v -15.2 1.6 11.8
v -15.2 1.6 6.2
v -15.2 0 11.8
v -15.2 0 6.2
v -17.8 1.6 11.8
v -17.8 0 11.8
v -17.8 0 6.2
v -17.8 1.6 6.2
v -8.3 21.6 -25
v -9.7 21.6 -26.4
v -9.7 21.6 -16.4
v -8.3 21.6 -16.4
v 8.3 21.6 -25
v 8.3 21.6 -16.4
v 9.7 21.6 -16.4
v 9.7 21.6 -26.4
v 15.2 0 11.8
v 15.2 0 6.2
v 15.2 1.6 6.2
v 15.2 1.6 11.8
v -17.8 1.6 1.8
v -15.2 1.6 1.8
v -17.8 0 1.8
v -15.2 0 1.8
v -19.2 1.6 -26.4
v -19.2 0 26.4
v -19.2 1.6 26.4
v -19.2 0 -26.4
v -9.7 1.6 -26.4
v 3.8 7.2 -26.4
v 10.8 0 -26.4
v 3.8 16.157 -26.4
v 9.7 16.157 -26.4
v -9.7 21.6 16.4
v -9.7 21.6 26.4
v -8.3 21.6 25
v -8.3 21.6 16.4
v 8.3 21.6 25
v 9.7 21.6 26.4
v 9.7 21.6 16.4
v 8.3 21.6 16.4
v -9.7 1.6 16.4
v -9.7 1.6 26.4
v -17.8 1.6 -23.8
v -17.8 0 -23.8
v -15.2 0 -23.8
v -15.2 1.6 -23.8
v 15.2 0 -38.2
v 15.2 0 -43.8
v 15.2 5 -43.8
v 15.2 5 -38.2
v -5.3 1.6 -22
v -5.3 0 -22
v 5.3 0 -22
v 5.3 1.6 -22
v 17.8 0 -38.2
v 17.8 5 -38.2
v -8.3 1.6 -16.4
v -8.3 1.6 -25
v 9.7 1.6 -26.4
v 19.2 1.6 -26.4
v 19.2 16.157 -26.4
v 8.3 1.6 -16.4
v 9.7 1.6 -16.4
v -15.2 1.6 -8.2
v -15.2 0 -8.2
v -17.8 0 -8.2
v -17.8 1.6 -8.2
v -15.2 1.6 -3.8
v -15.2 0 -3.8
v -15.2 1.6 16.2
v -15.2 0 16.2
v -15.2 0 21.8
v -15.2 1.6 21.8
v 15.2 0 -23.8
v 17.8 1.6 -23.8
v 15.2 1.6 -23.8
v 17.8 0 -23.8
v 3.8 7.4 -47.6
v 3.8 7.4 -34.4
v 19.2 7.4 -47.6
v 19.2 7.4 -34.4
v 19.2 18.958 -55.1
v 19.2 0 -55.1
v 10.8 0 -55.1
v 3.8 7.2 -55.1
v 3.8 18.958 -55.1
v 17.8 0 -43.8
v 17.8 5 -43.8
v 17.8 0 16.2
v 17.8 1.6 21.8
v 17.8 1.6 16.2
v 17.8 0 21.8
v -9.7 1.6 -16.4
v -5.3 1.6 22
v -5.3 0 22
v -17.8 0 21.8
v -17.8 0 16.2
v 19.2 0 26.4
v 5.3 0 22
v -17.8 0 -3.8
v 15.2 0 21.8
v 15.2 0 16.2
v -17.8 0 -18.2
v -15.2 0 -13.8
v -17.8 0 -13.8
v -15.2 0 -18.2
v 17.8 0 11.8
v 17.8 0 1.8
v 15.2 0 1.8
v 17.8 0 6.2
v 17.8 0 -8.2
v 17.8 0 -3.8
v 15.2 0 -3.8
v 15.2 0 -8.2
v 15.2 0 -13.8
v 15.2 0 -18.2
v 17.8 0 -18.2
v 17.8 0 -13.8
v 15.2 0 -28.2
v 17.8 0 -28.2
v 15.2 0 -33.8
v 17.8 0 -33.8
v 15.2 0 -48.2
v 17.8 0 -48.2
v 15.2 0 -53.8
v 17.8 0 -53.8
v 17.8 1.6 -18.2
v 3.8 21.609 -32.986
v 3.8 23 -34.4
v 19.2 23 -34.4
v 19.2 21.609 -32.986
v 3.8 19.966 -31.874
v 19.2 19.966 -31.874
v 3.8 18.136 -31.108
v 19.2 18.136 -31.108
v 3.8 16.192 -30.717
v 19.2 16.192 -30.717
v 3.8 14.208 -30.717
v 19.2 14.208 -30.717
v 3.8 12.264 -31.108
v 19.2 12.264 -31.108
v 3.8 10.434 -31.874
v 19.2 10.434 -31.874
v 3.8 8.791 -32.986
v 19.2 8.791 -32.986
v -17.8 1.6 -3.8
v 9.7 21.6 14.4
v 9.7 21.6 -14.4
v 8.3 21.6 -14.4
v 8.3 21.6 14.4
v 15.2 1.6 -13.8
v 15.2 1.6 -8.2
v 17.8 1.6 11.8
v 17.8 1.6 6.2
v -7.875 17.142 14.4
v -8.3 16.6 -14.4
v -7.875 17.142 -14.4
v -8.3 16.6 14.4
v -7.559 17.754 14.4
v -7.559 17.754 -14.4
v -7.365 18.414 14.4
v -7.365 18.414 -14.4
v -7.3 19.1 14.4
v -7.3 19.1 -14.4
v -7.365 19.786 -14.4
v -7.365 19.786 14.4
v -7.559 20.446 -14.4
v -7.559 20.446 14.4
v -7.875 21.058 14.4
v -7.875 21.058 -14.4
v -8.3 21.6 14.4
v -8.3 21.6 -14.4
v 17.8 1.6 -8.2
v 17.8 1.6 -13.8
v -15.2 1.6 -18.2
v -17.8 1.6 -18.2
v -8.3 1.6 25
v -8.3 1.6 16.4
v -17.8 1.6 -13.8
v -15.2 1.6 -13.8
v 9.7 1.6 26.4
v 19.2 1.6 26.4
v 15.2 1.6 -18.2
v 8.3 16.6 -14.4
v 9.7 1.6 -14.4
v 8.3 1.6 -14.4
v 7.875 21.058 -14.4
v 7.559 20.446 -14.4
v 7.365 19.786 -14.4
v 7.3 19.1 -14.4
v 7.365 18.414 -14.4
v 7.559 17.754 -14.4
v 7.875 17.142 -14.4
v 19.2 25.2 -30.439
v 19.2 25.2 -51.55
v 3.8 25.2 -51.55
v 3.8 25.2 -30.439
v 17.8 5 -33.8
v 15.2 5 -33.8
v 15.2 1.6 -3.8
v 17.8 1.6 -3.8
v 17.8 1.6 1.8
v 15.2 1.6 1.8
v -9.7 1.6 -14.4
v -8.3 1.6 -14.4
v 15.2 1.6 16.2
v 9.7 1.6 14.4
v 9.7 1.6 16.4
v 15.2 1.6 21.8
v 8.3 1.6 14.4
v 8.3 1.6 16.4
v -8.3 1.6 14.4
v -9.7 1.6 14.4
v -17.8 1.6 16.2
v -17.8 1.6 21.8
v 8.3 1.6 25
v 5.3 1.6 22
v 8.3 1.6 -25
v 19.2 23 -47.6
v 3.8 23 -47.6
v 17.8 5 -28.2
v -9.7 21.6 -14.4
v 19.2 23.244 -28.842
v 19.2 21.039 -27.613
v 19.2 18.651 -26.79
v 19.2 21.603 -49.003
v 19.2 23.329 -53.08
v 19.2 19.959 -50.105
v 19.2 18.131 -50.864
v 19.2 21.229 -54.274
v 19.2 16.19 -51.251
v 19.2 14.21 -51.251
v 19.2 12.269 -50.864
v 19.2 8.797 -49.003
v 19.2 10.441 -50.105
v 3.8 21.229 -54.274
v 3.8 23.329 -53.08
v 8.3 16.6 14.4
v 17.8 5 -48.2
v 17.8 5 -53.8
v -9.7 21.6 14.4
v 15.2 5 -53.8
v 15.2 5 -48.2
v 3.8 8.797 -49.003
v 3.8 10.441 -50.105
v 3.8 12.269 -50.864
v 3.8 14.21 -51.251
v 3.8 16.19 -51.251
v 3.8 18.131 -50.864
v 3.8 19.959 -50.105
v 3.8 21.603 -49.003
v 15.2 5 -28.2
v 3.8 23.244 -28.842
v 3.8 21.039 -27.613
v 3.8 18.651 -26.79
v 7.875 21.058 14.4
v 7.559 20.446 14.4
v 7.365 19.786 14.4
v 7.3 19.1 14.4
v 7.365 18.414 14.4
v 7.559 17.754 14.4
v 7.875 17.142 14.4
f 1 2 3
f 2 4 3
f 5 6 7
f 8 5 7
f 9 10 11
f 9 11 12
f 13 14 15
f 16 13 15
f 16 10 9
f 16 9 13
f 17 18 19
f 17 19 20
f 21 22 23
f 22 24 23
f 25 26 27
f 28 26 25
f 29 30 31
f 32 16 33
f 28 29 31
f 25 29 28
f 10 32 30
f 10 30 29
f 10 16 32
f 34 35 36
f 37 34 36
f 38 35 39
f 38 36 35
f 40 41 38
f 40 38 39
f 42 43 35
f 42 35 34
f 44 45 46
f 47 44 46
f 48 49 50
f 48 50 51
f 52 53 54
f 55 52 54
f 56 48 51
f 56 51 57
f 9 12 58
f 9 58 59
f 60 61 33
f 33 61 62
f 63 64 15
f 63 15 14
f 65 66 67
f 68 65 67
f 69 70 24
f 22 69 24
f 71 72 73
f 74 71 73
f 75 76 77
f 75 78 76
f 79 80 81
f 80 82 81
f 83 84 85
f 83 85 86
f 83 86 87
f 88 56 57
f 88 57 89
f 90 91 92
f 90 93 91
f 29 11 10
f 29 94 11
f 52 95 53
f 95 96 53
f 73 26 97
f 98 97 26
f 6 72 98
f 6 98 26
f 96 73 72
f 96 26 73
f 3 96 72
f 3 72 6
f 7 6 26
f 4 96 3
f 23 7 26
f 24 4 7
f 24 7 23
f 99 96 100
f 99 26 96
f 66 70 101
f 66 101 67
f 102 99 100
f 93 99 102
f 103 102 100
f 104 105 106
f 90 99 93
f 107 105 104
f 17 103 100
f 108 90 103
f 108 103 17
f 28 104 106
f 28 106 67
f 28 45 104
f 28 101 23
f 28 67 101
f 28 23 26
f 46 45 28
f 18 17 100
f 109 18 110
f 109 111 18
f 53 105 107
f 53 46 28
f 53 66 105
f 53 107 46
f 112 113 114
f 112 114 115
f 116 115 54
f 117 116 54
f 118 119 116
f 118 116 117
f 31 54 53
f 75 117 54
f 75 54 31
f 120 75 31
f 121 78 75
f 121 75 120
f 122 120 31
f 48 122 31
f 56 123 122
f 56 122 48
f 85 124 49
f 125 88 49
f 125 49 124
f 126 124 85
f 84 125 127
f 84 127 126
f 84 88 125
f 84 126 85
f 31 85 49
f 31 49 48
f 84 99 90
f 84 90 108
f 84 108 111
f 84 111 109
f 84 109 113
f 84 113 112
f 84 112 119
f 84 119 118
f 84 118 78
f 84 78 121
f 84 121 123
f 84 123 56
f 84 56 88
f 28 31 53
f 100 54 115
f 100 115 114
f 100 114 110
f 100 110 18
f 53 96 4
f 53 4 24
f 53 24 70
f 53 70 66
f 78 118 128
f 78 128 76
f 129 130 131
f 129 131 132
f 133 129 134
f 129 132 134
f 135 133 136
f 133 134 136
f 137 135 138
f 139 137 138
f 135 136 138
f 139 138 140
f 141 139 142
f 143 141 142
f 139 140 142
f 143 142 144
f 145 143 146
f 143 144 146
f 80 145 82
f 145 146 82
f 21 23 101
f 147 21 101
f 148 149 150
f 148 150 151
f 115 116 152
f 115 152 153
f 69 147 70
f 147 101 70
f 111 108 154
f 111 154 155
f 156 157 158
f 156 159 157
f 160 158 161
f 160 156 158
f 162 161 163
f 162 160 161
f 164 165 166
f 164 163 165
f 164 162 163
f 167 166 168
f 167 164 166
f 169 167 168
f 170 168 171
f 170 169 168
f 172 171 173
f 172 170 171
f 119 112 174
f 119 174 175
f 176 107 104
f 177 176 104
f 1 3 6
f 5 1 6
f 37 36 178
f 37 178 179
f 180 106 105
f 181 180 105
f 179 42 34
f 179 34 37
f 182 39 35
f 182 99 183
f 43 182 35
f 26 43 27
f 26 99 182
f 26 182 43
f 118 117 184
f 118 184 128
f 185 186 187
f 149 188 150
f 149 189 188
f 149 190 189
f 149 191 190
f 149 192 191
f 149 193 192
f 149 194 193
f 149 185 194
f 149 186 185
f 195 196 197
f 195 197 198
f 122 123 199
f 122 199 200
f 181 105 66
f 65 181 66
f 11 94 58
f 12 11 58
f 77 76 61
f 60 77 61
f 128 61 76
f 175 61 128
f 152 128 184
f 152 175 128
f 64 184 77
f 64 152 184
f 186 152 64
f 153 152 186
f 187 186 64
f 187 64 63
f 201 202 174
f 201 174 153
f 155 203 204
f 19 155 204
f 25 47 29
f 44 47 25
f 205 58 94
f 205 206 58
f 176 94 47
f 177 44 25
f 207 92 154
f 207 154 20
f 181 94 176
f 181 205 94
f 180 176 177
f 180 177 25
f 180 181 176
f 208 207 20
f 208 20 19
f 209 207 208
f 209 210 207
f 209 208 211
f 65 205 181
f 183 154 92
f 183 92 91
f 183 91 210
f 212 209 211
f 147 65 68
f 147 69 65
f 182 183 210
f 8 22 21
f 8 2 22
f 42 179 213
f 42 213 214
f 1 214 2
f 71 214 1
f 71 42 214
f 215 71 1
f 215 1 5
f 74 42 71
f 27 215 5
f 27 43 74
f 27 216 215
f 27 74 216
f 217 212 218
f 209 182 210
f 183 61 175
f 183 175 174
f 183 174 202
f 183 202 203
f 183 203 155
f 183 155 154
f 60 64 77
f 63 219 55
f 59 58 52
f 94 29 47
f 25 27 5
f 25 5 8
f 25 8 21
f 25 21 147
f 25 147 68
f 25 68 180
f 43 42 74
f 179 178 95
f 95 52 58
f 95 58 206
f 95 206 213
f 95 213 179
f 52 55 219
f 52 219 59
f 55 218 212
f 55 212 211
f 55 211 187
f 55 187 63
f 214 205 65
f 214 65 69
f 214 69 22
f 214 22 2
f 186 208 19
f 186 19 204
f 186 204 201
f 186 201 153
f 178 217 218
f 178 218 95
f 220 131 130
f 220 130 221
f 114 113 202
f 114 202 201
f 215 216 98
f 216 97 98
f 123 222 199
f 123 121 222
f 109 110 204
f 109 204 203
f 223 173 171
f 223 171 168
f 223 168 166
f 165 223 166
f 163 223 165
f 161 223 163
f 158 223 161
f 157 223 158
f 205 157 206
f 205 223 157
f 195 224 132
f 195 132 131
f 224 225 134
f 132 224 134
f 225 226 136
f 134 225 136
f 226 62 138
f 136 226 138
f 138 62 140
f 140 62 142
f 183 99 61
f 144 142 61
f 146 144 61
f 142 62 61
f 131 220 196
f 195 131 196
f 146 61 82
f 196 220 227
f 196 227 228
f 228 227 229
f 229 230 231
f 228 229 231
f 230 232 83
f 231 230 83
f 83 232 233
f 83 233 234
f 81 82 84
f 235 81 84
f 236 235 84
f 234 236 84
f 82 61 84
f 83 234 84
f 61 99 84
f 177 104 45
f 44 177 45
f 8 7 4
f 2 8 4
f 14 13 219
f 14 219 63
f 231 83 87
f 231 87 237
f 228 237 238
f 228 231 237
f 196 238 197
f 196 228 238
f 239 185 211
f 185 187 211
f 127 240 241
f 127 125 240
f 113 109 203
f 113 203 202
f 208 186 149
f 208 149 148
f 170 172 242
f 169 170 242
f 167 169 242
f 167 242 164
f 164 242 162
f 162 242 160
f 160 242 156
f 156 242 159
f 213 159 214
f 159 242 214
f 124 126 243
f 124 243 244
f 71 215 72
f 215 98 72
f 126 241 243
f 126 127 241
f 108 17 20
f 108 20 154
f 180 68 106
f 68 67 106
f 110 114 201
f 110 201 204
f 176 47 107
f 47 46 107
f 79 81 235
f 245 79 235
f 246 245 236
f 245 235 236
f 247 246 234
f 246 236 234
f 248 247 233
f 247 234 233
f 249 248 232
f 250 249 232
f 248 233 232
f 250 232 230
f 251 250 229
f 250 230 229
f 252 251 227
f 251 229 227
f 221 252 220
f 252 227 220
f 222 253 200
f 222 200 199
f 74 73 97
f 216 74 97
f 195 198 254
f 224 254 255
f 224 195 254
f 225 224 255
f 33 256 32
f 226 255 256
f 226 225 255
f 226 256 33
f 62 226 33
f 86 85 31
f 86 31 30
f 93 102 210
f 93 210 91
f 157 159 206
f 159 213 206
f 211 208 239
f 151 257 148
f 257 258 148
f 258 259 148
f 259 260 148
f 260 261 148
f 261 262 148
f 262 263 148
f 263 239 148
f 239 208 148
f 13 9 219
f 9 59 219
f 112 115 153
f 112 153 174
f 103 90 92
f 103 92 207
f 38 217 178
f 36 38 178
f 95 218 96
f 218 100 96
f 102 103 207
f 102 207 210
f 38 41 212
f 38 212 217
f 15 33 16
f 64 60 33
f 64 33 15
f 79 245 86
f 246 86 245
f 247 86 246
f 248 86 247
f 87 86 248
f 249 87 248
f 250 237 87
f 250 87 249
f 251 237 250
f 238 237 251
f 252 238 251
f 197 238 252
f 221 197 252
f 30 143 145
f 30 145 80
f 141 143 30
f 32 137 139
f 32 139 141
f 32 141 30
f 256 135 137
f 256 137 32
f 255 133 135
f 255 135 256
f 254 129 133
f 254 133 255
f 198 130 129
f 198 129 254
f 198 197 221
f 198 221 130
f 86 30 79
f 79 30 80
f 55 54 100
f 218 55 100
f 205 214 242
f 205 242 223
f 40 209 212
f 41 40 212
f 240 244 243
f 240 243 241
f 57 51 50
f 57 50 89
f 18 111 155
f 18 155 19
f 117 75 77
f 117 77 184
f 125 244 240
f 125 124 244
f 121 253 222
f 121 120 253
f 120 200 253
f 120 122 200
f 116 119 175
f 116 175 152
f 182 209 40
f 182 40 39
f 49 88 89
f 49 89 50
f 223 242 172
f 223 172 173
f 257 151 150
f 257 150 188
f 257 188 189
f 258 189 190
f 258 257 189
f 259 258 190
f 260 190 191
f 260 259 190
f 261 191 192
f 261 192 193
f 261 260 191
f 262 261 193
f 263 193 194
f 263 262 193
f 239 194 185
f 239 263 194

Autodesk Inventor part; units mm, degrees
ref_plane "YZ Plane" through (0, 0, 0) normal (1, 0, 0) x (0, 1, 0)
ref_plane "XZ Plane" through (0, 0, 0) normal (0, 1, 0) x (-1, 0, 0)
ref_plane "XY Plane" through (0, 0, 0) normal (0, 0, 1) x (1, 0, 0)
sketch "Sketch1" plane through (0, 0, 0) normal (0, 1, 0) x (-1, 0, 0)
  line L0 (-19.2, 26.4) -> (19.2, 26.4)
  line L1 (19.2, 26.4) -> (19.2, -26.4)
  line L2 (10.8, -26.4) -> (-10.8, -26.4)
  line L3 (-19.2, -26.4) -> (-19.2, 26.4)
  line L4 (-19.2, 26.4) -> (19.2, -26.4) construction
  line L5 (19.2, 26.4) -> (-19.2, -26.4) construction
  line L6 (-5.3, 22) -> (5.3, 22)
  line L7 (5.3, 22) -> (5.3, -22)
  line L8 (5.3, -22) -> (-5.3, -22)
  line L9 (-5.3, -22) -> (-5.3, 22)
  line L10 (-5.3, 22) -> (5.3, -22) construction
  line L11 (5.3, 22) -> (-5.3, -22) construction
  line L12 (-10.8, -26.4) -> (-10.8, -55.1)
  line L13 (-10.8, -55.1) -> (-19.2, -55.1)
  line L14 (-19.2, -55.1) -> (-19.2, -26.4)
  line L15 (10.8, -26.4) -> (19.2, -26.4)
  point P0 (0, 0)
  point P1 (13.2741, -55.1)
  dimension "d4" = 10.6
  dimension "d5" = 44
  dimension "d37" = 8.4
extrude "Extrusion1" add sketch "Sketch1" along normal blind 1.6
sketch "Sketch3" plane through (0, 1.6, 0) normal (0, 1, 0) x (1, 0, 0)
  line L0 (-5.3, 22) -> (5.3, 22) projected
  line L1 (5.3, -22) -> (-5.3, -22) projected
  line L2 (-19.2, -26.4) -> (19.2, -26.4) projected
  line L3 (10.8, 26.4) -> (-19.2, 26.4) projected
  line L4 (9.7, -26.4) -> (-9.7, -26.4)
  line L5 (-9.7, -26.4) -> (-9.7, 26.4)
  line L6 (-9.7, 26.4) -> (9.7, 26.4)
  line L7 (9.7, 26.4) -> (9.7, -26.4)
  line L8 (9.7, -26.4) -> (-9.7, 26.4) construction
  line L9 (-9.7, -26.4) -> (9.7, 26.4) construction
  line L10 (8.3, -25) -> (-8.3, -25)
  line L11 (-8.3, -25) -> (-8.3, 25)
  line L12 (-8.3, 25) -> (8.3, 25)
  line L13 (8.3, 25) -> (8.3, -25)
  line L14 (8.3, -25) -> (-8.3, 25) construction
  line L15 (-8.3, -25) -> (8.3, 25) construction
  line L16 (-9.7, 16.4) -> (-8.3, 16.4)
  line L17 (-9.7, 14.4) -> (-8.3, 14.4)
  line L18 (-9.7, -14.4) -> (-8.3, -14.4)
  line L19 (-9.7, -16.4) -> (-8.3, -16.4)
  line L20 (0, 22) -> (0, -22)
  line L21 (9.7, 16.4) -> (8.3, 16.4)
  line L22 (9.7, 14.4) -> (8.3, 14.4)
  line L23 (9.7, -14.4) -> (8.3, -14.4)
  line L24 (9.7, -16.4) -> (8.3, -16.4)
  line L25 (8.3, 16.4) -> (8.3, 14.4)
  line L26 (9.7, 16.4) -> (9.7, 14.4)
  line L27 (9.7, -14.4) -> (9.7, -16.4)
  line L28 (8.3, -14.4) -> (8.3, -16.4)
  point P0 (19.2, 26.4)
  point P1 (-10.8, 26.4)
  point P2 (0, 0)
  point P3 (0, 0)
  dimension "d8" = 19.4
  dimension "d9" = 1.4
  dimension "d10" = 1.4
  dimension "d11" = 2
  dimension "d12" = 10
  dimension "d13" = 2
  dimension "d14" = 10
extrude "Extrusion2" add sketch "Sketch3" along normal blind 20 contours L5 L19 L11 L10 L13 L24 L7 L2 | L5 L17 L11 L18 | L23 L13 L22 L7 | L5 L3 L7 L21 L13 L12 L11 L16
sketch "Sketch8" plane through (0, 1.6, 0) normal (0, 1, 0) x (1, 0, 0)
  line L0 (19.2, -26.4) -> (19.2, 55.1) projected
  line L1 (10.8, 55.1) -> (19.2, 55.1)
  line L2 (19.2, 55.1) -> (19.2, 26.4)
  line L3 (19.2, 26.4) -> (10.8, 26.4)
  line L4 (10.8, 26.4) -> (10.8, 55.1)
  point P0 (0, 0)
extrude "Extrusion6" add sketch "Sketch8" along normal blind 23.6
sketch "Sketch9" plane through (10.8, 0, -55.1) normal (-1, 0, 0) x (0, 0, 1)
  line L0 (28.7, 0) -> (0, 0) projected
  line L1 (28.7, 0) -> (28.7, 1.6) projected
  line L2 (28.7, 1.6) -> (28.7, 25.2) projected
  line L3 (0, 25.2) -> (28.7, 25.2) projected
  line L4 (0, 0) -> (0, 25.2) projected
  point P0 (55.1, 0)
extrude "Extrusion7" add sketch "Sketch9" along normal blind 7
sketch "Sketch10" plane through (19.2, 0, -55.1) normal (0, 0, -1) x (-1, 0, 0)
  line L0 (15.4, 0) -> (0, 0) projected
  line L1 (15.4, 25.2) -> (15.4, 0) projected
  line L2 (8.4, 0) -> (15.4, 7.2)
  point P0 (19.2, 0)
  dimension "d42" = 7.2
  dimension "d43" = 7
extrude "Extrusion8" cut sketch "Sketch10" against normal up to surface (28.7 mm away)
sketch "Sketch11" plane through (19.2, 0, 26.4) normal (1, 0, 0) x (0, 0, -1)
  line L0 (81.5, 0) -> (0, 0) projected
  line L1 (81.5, 0) -> (81.5, 25.2) projected
  line L2 (52.8, 25.2) -> (81.5, 25.2) projected
  line L3 (52.8, 1.6) -> (52.8, 25.2) projected
  line L4 (52.8, 7.4) -> (81.5, 7.4)
  line L5 (55.0793, 23) -> (79.6991, 23)
  arc A0 (60.8, 23) -> (60.8, 7.4) centre (67.0851, 15.2) ccw
  arc A1 (74, 7.4) -> (74, 23) centre (67.6284, 15.2) ccw
  arc A2 (56.8391, 25.2) -> (52.8, 16.1566) centre (67.0851, 15.2) ccw
  line L6 (52.8, 14.2434) -> (52.8, 7.4)
  line L7 (52.8, 7.4) -> (60.8, 7.4)
  line L8 (74.3931, 7.4) -> (81.5, 7.4)
  arc A3 (81.5, 18.9579) -> (77.9504, 25.2) centre (67.6284, 15.2) ccw
  line L9 (81.5, 11.4421) -> (81.5, 7.4)
  line L10 (77.9504, 25.2) -> (56.8391, 25.2)
  arc A4 (56.8391, 25.2) -> (52.8, 16.1566) centre (67.0851, 15.2) ccw
  line L11 (56.8391, 25.2) -> (52.8, 25.2)
  line L12 (52.8, 25.2) -> (52.8, 14.2434)
  line L13 (77.9504, 25.2) -> (81.5, 25.2)
  line L14 (81.5, 25.2) -> (81.5, 18.9579)
  arc A5 (56.8391, 25.2) -> (52.8, 16.1566) centre (67.0851, 15.2) ccw
  line L15 (52.8, 16.1566) -> (52.8, 25.2)
  line L16 (52.8, 25.2) -> (56.8391, 25.2)
  point P0 (26.4, 0)
  point P1 (77.7, 15.2)
  point P2 (57.1, 15.2)
  dimension "d46" = 7.4
  dimension "d47" = 2.2
  dimension "d48" = 8
  dimension "d49" = 13.2
  dimension "d50" = 7.8
  dimension "d51" = 3.7
  dimension "d52" = 8
  dimension "d53" = 13.2
  dimension "d54" = 7.8
  dimension "d55" = 3.7
  dimension "d56" = 4.3
  dimension "d57" = 4.3
extrude "Extrusion9" cut sketch "Sketch11" against normal up to surface (15.4 mm away) contours A3 L2 L1 | L4 A0 L5 A1 | A2 L3 L2
sketch "Sketch12" plane through (0, 0, 0) normal (0, -1, 0) x (1, 0, 0)
  line L0 (19.2, -55.1) -> (19.2, 26.4) projected
  line L1 (19.2, 26.4) -> (-19.2, 26.4) projected
  line L2 (-5.3, 22) -> (5.3, 22) projected
  line L3 (5.3, -22) -> (-5.3, -22) projected
  line L4 (15.2, 21.8) -> (17.8, 21.8)
  line L5 (17.8, 21.8) -> (17.8, 16.2)
  line L6 (17.8, 16.2) -> (15.2, 16.2)
  line L7 (15.2, 16.2) -> (15.2, 21.8)
  line L8 (0, 22) -> (0, -22)
  line L9 (15.2, 11.8) -> (17.8, 11.8)
  line L10 (17.8, 11.8) -> (17.8, 6.2)
  line L11 (17.8, 6.2) -> (15.2, 6.2)
  line L12 (15.2, 6.2) -> (15.2, 11.8)
  line L13 (15.2, 1.8) -> (17.8, 1.8)
  line L14 (17.8, 1.8) -> (17.8, -3.8)
  line L15 (17.8, -3.8) -> (15.2, -3.8)
  line L16 (15.2, -3.8) -> (15.2, 1.8)
  line L17 (15.2, -8.2) -> (17.8, -8.2)
  line L18 (17.8, -8.2) -> (17.8, -13.8)
  line L19 (17.8, -13.8) -> (15.2, -13.8)
  line L20 (15.2, -13.8) -> (15.2, -8.2)
  line L21 (15.2, -18.2) -> (17.8, -18.2)
  line L22 (17.8, -18.2) -> (17.8, -23.8)
  line L23 (17.8, -23.8) -> (15.2, -23.8)
  line L24 (15.2, -23.8) -> (15.2, -18.2)
  line L25 (15.2, -28.2) -> (17.8, -28.2)
  line L26 (17.8, -28.2) -> (17.8, -33.8)
  line L27 (17.8, -33.8) -> (15.2, -33.8)
  line L28 (15.2, -33.8) -> (15.2, -28.2)
  line L29 (15.2, -38.2) -> (17.8, -38.2)
  line L30 (17.8, -38.2) -> (17.8, -43.8)
  line L31 (17.8, -43.8) -> (15.2, -43.8)
  line L32 (15.2, -43.8) -> (15.2, -38.2)
  line L33 (15.2, -48.2) -> (17.8, -48.2)
  line L34 (17.8, -48.2) -> (17.8, -53.8)
  line L35 (17.8, -53.8) -> (15.2, -53.8)
  line L36 (15.2, -53.8) -> (15.2, -48.2)
  line L37 (-15.2, 21.8) -> (-17.8, 21.8)
  line L38 (-17.8, 21.8) -> (-17.8, 16.2)
  line L39 (-17.8, 16.2) -> (-15.2, 16.2)
  line L40 (-15.2, 16.2) -> (-15.2, 21.8)
  line L41 (-15.2, 11.8) -> (-17.8, 11.8)
  line L42 (-17.8, 11.8) -> (-17.8, 6.2)
  line L43 (-15.2, 6.2) -> (-15.2, 11.8)
  line L44 (-17.8, 6.2) -> (-15.2, 6.2)
  line L45 (-15.2, 1.8) -> (-17.8, 1.8)
  line L46 (-17.8, 1.8) -> (-17.8, -3.8)
  line L47 (-15.2, -3.8) -> (-15.2, 1.8)
  line L48 (-17.8, -3.8) -> (-15.2, -3.8)
  line L49 (-15.2, -8.2) -> (-17.8, -8.2)
  line L50 (-17.8, -8.2) -> (-17.8, -13.8)
  line L51 (-15.2, -13.8) -> (-15.2, -8.2)
  line L52 (-17.8, -13.8) -> (-15.2, -13.8)
  line L53 (-15.2, -18.2) -> (-17.8, -18.2)
  line L54 (-17.8, -18.2) -> (-17.8, -23.8)
  line L55 (-15.2, -23.8) -> (-15.2, -18.2)
  line L56 (-17.8, -23.8) -> (-15.2, -23.8)
  point P0 (0, 0)
  dimension "d60" = 1.4
  dimension "d61" = 5.6
  dimension "d62" = 4.6
  dimension "d63" = 2.6
  dimension "d66" = 10
extrude "Extrusion10" cut sketch "Sketch12" against normal blind 5
sketch "Sketch13" plane through (8.3, 1.6, -14.4) normal (-1, 0, 0) x (0, 0, 1)
  line L0 (28.8, 0) -> (28.8, 20) projected
  line L1 (0, 20) -> (28.8, 20) projected
  line L2 (0, 20) -> (28.8, 20)
  line L3 (28.8, 20) -> (28.8, 15)
  line L4 (28.8, 15) -> (0, 15)
  line L5 (0, 15) -> (0, 20)
  point P0 (14.4, -1.6)
  dimension "d73" = 5
extrude "Extrusion11" add sketch "Sketch13" along normal blind 5
sketch "Sketch14" plane through (8.3, 1.6, 14.4) normal (0, 0, 1) x (1, 0, 0)
  line L0 (1.4, 20) -> (-5, 20) projected
  line L1 (-5, 15) -> (-5, 20) projected
  line L2 (0, 15) -> (-5, 15) projected
  line L3 (0, 15) -> (0, 20)
  arc A0 (0, 20) -> (0, 15) centre (2.625, 17.5) ccw
  point P0 (-8.3, -1.6)
  point P1 (-1, 17.5)
  dimension "d76" = 1
extrude "Extrusion12" cut sketch "Sketch14" against normal up to surface (28.8 mm away) contours A0 L2 L1 L0
mirror "Mirror1" about plane through (0, 0, 0) normal (1, 0, 0) of "Extrusion11", "Extrusion12"
properties part number "motor housing"
